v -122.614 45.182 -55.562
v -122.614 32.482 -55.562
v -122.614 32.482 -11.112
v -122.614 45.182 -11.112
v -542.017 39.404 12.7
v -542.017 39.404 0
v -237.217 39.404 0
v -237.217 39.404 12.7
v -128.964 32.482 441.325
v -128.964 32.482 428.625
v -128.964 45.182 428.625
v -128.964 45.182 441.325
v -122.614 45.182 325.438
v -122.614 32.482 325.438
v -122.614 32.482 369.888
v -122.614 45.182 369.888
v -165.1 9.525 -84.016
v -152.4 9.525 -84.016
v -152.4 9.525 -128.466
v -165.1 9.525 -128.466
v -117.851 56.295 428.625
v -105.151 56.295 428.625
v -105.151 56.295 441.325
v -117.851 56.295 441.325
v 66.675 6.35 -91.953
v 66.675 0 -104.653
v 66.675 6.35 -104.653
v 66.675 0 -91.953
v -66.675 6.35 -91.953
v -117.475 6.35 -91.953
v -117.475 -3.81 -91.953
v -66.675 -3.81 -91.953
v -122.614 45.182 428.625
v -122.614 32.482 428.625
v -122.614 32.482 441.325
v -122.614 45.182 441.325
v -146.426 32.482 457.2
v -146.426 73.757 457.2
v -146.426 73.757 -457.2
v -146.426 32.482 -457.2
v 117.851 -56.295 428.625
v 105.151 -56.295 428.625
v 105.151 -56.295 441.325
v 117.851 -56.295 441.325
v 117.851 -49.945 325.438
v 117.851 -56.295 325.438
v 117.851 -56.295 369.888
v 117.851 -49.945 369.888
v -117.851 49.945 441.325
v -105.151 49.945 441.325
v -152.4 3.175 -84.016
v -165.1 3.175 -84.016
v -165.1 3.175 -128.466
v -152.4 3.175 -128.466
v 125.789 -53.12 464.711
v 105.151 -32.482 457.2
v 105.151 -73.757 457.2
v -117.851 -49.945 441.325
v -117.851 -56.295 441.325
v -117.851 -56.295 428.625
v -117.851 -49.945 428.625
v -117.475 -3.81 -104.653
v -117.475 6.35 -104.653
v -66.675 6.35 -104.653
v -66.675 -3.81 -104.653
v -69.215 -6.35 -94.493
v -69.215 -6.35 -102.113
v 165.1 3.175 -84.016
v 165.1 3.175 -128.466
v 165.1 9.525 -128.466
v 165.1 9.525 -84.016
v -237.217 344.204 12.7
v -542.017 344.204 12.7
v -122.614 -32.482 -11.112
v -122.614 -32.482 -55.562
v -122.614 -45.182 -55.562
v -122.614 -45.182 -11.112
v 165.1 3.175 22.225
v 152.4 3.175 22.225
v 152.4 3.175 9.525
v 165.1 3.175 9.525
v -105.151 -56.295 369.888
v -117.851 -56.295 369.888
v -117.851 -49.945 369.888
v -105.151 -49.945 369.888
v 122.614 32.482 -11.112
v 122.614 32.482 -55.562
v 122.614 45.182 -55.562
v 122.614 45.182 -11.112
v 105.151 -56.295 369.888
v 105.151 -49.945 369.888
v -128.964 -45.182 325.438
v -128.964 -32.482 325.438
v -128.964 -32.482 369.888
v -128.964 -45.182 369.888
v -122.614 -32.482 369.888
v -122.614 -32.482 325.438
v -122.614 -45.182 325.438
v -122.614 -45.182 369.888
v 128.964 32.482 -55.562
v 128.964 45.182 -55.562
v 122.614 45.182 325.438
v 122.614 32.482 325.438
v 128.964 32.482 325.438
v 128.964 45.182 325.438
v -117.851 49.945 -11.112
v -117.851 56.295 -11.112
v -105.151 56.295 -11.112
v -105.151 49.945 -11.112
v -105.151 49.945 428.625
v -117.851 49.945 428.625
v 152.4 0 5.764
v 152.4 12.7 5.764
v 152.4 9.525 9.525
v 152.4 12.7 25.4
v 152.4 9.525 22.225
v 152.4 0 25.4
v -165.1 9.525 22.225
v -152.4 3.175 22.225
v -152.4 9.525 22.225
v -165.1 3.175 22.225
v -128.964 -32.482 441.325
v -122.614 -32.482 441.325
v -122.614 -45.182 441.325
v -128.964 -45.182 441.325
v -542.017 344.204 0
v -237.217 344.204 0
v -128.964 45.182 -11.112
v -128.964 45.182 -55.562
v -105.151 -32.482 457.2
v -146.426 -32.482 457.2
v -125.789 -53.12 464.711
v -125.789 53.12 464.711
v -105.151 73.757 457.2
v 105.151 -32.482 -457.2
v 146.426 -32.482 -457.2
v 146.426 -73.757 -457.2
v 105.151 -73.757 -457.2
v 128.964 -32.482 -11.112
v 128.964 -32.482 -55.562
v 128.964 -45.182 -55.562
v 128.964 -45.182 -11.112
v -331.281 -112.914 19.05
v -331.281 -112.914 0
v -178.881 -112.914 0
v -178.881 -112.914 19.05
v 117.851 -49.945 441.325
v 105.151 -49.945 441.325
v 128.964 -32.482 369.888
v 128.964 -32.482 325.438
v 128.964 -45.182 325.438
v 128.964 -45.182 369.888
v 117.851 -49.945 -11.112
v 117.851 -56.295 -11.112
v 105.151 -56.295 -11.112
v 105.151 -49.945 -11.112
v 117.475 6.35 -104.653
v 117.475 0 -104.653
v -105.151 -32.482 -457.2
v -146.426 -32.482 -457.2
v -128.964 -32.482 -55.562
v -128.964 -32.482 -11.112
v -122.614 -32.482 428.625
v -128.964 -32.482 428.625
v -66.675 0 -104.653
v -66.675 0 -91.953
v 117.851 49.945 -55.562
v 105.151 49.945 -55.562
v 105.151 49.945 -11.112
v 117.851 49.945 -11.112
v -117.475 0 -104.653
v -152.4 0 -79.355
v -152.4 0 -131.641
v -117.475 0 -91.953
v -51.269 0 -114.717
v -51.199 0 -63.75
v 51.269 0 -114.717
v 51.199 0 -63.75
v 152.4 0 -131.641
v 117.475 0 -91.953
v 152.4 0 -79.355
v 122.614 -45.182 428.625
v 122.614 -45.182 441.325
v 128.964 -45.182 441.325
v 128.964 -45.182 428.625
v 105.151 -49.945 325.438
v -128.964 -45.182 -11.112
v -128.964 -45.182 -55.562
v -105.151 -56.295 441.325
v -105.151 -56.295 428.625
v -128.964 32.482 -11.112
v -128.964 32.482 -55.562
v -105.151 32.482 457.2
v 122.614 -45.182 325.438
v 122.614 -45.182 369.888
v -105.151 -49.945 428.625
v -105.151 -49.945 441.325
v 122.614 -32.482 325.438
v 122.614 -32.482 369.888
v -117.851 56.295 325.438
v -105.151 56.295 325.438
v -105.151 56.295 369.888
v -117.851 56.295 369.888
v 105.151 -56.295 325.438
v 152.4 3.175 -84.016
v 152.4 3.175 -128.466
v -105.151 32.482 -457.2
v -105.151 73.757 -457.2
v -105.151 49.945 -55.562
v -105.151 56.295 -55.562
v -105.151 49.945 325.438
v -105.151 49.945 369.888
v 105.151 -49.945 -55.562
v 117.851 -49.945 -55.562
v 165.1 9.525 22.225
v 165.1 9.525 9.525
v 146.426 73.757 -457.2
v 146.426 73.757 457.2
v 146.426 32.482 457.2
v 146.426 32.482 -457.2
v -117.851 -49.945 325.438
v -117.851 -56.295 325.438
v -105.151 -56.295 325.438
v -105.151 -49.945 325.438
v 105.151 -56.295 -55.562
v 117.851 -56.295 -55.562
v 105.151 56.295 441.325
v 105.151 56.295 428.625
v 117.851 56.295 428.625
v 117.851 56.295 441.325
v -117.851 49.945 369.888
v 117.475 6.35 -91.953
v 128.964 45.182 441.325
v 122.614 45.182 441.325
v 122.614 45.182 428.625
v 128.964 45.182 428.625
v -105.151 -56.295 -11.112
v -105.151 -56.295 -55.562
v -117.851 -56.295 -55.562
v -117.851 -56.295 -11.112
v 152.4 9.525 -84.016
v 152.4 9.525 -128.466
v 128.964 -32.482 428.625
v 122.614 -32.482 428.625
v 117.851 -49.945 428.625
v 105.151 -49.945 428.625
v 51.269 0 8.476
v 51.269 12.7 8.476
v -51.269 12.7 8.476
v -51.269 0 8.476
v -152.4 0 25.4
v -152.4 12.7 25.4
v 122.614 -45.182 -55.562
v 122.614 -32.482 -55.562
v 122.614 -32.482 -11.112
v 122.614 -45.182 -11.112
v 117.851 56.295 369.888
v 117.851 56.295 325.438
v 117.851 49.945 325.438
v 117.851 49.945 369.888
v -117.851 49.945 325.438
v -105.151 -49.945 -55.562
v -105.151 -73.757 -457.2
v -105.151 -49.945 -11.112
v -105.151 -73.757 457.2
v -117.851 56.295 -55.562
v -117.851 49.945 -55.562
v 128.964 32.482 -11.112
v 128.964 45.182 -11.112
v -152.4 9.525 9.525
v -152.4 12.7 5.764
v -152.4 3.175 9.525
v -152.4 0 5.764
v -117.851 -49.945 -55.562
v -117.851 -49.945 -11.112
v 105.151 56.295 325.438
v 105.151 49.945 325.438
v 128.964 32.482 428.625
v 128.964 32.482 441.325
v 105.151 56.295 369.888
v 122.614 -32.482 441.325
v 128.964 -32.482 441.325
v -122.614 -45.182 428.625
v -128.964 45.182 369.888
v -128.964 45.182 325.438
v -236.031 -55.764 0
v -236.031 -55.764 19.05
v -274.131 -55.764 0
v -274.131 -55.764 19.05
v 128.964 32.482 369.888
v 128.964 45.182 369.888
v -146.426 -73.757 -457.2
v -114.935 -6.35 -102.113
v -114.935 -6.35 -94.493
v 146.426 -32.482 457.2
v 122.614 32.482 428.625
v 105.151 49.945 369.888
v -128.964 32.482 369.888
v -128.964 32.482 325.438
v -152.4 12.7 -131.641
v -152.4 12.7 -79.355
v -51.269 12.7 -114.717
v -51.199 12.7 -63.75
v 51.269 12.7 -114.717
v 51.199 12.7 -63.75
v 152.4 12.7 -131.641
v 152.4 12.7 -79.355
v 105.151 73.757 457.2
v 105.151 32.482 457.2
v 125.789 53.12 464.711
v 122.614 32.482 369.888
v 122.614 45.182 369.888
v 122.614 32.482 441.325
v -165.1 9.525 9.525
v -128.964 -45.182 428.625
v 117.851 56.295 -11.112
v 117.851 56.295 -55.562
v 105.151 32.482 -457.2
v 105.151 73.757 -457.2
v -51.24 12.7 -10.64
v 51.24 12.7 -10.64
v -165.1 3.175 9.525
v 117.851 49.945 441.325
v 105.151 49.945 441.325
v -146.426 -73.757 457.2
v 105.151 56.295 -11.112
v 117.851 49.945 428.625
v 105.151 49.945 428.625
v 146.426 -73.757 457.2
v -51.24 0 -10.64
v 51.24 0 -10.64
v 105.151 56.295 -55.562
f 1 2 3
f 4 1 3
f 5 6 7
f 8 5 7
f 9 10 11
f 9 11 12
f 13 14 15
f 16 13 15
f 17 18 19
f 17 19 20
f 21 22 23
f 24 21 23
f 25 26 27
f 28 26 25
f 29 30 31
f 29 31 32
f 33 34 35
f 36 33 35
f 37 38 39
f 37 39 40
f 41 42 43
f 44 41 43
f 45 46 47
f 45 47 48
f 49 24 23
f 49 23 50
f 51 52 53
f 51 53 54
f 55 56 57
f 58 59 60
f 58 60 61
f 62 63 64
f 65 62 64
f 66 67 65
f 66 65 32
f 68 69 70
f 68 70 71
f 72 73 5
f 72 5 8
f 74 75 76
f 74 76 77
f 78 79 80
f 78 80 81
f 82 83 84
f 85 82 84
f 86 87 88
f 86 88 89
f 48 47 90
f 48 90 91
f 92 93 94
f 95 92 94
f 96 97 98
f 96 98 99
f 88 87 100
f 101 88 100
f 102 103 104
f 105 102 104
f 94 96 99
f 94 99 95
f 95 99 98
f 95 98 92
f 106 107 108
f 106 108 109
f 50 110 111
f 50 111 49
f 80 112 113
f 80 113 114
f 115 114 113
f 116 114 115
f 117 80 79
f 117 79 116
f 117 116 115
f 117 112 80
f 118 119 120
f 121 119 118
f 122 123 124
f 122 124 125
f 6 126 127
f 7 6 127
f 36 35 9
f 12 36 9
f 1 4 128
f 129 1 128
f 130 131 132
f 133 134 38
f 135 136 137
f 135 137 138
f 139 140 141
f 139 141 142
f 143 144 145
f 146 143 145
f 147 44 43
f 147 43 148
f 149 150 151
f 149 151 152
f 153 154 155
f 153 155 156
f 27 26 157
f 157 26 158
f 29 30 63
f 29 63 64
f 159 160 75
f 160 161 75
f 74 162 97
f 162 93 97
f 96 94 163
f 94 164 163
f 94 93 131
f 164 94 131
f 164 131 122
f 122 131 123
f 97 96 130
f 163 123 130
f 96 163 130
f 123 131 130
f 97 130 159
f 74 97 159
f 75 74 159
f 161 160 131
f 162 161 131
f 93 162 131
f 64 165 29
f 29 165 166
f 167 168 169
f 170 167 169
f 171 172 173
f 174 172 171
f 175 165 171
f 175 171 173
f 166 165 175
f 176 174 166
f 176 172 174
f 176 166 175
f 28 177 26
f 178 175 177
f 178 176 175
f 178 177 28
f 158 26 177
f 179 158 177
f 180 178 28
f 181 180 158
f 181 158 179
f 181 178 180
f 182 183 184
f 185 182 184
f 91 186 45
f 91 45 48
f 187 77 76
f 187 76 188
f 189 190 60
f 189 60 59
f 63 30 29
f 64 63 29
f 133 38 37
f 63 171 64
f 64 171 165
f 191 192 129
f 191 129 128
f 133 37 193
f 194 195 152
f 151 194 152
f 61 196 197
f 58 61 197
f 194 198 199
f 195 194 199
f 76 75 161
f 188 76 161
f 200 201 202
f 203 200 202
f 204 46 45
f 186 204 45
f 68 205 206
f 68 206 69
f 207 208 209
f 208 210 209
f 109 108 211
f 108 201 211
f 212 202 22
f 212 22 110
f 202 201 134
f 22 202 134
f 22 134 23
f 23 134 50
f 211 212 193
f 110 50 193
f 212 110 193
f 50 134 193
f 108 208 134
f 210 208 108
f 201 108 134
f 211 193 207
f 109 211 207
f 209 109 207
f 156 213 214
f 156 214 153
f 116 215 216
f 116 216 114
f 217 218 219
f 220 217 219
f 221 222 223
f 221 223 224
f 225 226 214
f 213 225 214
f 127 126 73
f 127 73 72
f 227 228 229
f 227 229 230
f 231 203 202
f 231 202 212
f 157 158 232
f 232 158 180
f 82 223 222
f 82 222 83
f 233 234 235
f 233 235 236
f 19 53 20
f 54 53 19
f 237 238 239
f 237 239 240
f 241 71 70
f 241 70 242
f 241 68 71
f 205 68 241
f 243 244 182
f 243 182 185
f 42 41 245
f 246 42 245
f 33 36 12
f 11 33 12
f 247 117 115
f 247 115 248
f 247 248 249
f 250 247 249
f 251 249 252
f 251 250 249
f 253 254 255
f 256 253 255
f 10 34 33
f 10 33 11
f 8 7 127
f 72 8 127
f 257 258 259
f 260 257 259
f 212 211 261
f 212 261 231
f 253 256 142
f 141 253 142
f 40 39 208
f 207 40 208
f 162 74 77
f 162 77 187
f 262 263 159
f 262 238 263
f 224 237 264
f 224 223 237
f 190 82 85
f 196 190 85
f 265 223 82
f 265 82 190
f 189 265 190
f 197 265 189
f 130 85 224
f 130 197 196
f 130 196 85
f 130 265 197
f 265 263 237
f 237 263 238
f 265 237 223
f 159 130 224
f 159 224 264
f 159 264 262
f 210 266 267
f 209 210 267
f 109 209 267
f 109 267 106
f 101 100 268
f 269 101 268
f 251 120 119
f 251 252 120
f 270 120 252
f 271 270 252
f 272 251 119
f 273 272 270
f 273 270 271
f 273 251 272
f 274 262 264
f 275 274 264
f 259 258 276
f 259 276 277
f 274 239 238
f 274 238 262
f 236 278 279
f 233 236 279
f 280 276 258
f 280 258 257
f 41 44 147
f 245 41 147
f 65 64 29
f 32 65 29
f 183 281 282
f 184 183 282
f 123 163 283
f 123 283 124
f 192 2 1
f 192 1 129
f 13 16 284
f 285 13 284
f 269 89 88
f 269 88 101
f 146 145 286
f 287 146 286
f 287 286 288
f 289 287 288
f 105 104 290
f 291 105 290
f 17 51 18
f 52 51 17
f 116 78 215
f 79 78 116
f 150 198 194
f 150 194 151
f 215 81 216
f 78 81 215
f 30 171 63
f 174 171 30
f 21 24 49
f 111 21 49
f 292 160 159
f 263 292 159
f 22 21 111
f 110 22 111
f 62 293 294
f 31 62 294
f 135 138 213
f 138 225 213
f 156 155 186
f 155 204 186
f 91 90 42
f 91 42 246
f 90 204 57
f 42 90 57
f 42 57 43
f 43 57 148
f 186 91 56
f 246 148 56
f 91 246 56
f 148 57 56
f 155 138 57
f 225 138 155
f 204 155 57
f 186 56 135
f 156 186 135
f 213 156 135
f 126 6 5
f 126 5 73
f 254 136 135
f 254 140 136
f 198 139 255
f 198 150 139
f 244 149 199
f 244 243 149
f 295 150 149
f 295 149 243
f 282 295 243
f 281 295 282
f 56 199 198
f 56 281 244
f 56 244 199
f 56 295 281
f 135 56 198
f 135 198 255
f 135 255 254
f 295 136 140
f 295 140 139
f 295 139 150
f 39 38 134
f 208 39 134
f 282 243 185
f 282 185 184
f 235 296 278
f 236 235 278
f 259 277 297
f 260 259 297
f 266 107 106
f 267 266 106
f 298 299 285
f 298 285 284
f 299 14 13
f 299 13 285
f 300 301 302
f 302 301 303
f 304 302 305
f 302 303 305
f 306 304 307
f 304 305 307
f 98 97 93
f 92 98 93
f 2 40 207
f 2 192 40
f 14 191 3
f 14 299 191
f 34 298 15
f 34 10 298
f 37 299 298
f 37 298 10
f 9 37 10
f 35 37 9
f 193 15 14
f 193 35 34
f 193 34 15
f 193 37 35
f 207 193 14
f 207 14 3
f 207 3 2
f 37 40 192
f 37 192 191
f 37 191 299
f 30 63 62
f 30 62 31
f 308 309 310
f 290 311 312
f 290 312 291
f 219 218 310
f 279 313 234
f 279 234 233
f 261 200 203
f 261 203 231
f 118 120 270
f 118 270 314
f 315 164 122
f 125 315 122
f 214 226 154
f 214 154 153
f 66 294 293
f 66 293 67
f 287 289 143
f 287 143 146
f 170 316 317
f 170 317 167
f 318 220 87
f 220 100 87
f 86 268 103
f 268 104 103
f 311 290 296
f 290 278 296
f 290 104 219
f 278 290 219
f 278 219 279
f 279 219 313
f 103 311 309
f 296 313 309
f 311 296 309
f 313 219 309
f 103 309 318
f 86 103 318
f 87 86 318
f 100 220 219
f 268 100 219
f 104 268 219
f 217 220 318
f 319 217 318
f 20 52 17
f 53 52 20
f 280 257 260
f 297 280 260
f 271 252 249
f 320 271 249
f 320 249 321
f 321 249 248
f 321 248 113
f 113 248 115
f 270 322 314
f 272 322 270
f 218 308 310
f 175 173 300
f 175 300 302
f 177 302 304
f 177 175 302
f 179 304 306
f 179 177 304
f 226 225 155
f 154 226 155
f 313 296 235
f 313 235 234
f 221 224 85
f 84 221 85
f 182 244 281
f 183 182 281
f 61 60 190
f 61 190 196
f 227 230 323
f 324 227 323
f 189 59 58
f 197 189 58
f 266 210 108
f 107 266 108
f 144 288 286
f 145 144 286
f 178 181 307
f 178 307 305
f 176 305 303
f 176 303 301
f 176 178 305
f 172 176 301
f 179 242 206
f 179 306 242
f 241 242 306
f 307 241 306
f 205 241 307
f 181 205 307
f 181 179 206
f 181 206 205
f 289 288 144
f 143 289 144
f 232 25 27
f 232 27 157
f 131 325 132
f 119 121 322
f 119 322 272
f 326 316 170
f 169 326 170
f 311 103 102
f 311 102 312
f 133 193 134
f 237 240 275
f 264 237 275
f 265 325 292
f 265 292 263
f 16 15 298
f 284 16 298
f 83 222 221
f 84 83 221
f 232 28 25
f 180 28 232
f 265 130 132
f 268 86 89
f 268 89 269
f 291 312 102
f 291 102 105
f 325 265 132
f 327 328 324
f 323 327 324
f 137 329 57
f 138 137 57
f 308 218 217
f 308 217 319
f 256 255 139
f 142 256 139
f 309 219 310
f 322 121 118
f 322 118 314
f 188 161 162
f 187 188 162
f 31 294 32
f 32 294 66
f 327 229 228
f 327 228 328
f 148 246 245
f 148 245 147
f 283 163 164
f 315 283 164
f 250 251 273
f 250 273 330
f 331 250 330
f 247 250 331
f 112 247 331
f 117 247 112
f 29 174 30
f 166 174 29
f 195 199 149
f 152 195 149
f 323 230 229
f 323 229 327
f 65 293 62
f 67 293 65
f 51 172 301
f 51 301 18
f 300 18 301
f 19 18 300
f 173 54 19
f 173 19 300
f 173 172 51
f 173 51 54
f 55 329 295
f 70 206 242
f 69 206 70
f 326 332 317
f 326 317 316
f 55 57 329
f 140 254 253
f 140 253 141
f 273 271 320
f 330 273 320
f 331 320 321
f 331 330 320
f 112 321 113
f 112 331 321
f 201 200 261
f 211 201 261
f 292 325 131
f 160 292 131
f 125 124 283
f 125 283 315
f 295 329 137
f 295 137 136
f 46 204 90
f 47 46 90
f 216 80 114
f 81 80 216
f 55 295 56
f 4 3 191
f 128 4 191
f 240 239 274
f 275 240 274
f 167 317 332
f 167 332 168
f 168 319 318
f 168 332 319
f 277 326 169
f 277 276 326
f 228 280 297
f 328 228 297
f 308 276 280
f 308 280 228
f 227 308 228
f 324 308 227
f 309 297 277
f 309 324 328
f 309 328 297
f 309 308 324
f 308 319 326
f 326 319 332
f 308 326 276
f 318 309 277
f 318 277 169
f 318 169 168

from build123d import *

# Parameters (mm, degrees)
F1_DEPTH   = 12.7
F3_DEPTH   = 12.7
F4_W       = 50.8
F4_H       = 12.7
F5_DEPTH   = 6.35
F6_W       = 41.275
F6_H       = 41.275
F7_DEPTH   = 457.2
F7_FACE1_W = 41.275
F7_FACE1_H = 41.275
F9_DEPTH   = 7.9375
F9_TAPER   = 70
F10_W      = 6.35
F10_H      = 12.7
F10_H_2    = 44.45
F12_DEPTH  = 12.7
F11_W      = 12.7
F11_H      = 12.7
F13_DEPTH  = 3.175
F14_W      = 12.7
F14_H      = 12.7
F15_DEPTH  = 3.175
F16_W      = 12.7
F16_H      = 44.45
F17_DEPTH  = 3.175
F18_W      = 12.7
F18_H      = 44.45
F19_DEPTH  = 3.175
F8_W       = 6.35
F8_H       = 12.7
F8_H_2     = 44.45
F20_DEPTH  = 12.7
F23_W      = 50.8
F23_H      = 12.7
F24_DEPTH  = 12.7
F25_SIZE   = 2.54
F26_SIZE   = 2.54
F29_DEPTH  = 19.05
F30_W      = 304.8
F30_H      = 304.8
F31_DEPTH  = 12.7


with BuildPart() as f1:
    # F0 (on Front) → F1 (new body)
    with BuildSketch(Plane.XZ):
        with BuildLine():
            Line((-152.4, 22.225), (-165.1, 22.225))
            Line((-165.1, 22.225), (-165.1, 9.525))
            Line((-165.1, 9.525), (-152.4, 9.525))
            Line((-152.4, 9.525), (-152.4, 5.7641233607))
            ThreePointArc((-152.4, 5.7641233607), (0, -12.7), (152.4, 5.7641233607))
            Line((152.4, 5.7641233607), (152.4, 9.525))
            Line((152.4, 9.525), (165.1, 9.525))
            Line((165.1, 9.525), (165.1, 22.225))
            Line((165.1, 22.225), (152.4, 22.225))
            Line((152.4, 22.225), (152.4, 25.4))
            ThreePointArc((152.4, 25.4), (0, 6.35), (-152.4, 25.4))
            Line((-152.4, 25.4), (-152.4, 22.225))
        make_face()
    extrude(amount=-F1_DEPTH)

    # F11 (on face) → F13 (cut)
    with BuildSketch(Plane.XZ):
        with Locations((-158.75, 15.875)):
            Rectangle(F11_W, F11_H)
        with Locations((158.75, 15.875)):
            Rectangle(F11_W, F11_H)
    extrude(amount=-F13_DEPTH, mode=Mode.SUBTRACT)

    # F14 (on face) → F15 (cut)
    with BuildSketch(Plane(origin=(0, 12.7, 0), x_dir=(-1, 0, 0), z_dir=(0, 1, 0))):
        with Locations((-158.75, 15.875)):
            Rectangle(F14_W, F14_H)
        with Locations((158.75, 15.875)):
            Rectangle(F14_W, F14_H)
    extrude(amount=-F15_DEPTH, mode=Mode.SUBTRACT)


with BuildPart() as f3:
    # F2 (on Front) → F3 (new body)
    with BuildSketch(Plane.XZ):
        with BuildLine():
            Line((-152.4, -84.0155451241), (-165.1, -84.0155451241))
            Line((-165.1, -84.0155451241), (-165.1, -128.4655451241))
            Line((-165.1, -128.4655451241), (-152.4, -128.4655451241))
            Line((-152.4, -128.4655451241), (-152.4, -131.6405451241))
            ThreePointArc((-152.4, -131.6405451241), (0, -112.5905451241), (152.4, -131.6405451241))
            Line((152.4, -131.6405451241), (152.4, -128.4655451241))
            Line((152.4, -128.4655451241), (165.1, -128.4655451241))
            Line((165.1, -128.4655451241), (165.1, -84.0155451241))
            Line((165.1, -84.0155451241), (152.4, -84.0155451241))
            Line((152.4, -84.0155451241), (152.4, -79.3554102101))
            ThreePointArc((152.4, -79.3554102101), (0, -61.7905451241), (-152.4, -79.3554102101))
            Line((-152.4, -79.3554102101), (-152.4, -84.0155451241))
        make_face()
    extrude(amount=-F3_DEPTH)

    # F4 (on face) → F5 (cut)
    with BuildSketch(Plane.XZ):
        with Locations((-92.075, -98.3030451241)):
            Rectangle(F4_W, F4_H)
        with Locations((92.075, -98.3030451241)):
            Rectangle(F4_W, F4_H)
    extrude(amount=-F5_DEPTH, mode=Mode.SUBTRACT)

    # F16 (on face) → F17 (cut)
    with BuildSketch(Plane(origin=(0, 12.7, 0), x_dir=(-1, 0, 0), z_dir=(0, 1, 0))):
        with Locations((-158.75, -106.2405451241)):
            Rectangle(F16_W, F16_H)
        with Locations((158.75, -106.2405451241)):
            Rectangle(F16_W, F16_H)
    extrude(amount=-F17_DEPTH, mode=Mode.SUBTRACT)

    # F18 (on face) → F19 (cut)
    with BuildSketch(Plane.XZ):
        with Locations((-158.75, -106.2405451241)):
            Rectangle(F18_W, F18_H)
        with Locations((158.75, -106.2405451241)):
            Rectangle(F18_W, F18_H)
    extrude(amount=-F19_DEPTH, mode=Mode.SUBTRACT)


with BuildPart() as f7:
    # F6 (on Top) → F7 (new body, symmetric)
    with BuildSketch(Plane.XY):
        with Locations((-125.7886141539, -53.1197041273)):
            Rectangle(F6_W, F6_H)
    extrude(amount=F7_DEPTH, both=True)

    # F7_face1 (on face) → F9 (join)
    with BuildSketch(Plane(origin=(-125.7886141539, -53.1197041273, 457.2), x_dir=(1, 0, 0), z_dir=(0, 0, 1))):
        Rectangle(F7_FACE1_W, F7_FACE1_H)
    extrude(amount=F9_DEPTH, taper=F9_TAPER)

    # F10 (on face) → F12 (cut)
    with BuildSketch(Plane(origin=(0, -32.4822041273, 0), x_dir=(-1, 0, 0), z_dir=(0, 1, 0))):
        with Locations((125.7886141539, 434.975)):
            Rectangle(F10_W, F10_H)
        with Locations((125.7886141539, 347.6625)):
            Rectangle(F10_W, F10_H_2)
        with Locations((125.7886141539, -33.3375)):
            Rectangle(F10_W, F10_H_2)
    extrude(amount=-F12_DEPTH, mode=Mode.SUBTRACT)

    # F8 (on face) → F20 (cut)
    with BuildSketch(Plane.YZ.offset(-105.1511141539)):
        with Locations((-53.1197041273, 434.975)):
            Rectangle(F8_W, F8_H)
        with Locations((-53.1197041273, 347.6625)):
            Rectangle(F8_W, F8_H_2)
        with Locations((-53.1197041273, -33.3375)):
            Rectangle(F8_W, F8_H_2)
    extrude(amount=-F20_DEPTH, mode=Mode.SUBTRACT)


with BuildPart() as f21_1:
    # F21: instance of F7
    add(f7.part.mirror(Plane.YZ))


with BuildPart() as f22_1:
    # F22: instance of F21_1
    add(f21_1.part.mirror(Plane.XZ))


with BuildPart() as f22_2:
    # F22: instance of F7
    add(f7.part.mirror(Plane.XZ))


with BuildPart() as f24:
    # F23 (on face) → F24 (new body)
    with BuildSketch(Plane.XZ.offset(-6.35)):
        with Locations((-92.075, -98.3030451241)):
            Rectangle(F23_W, F23_H)
    extrude(amount=F24_DEPTH)

    # F25
    f25_edges = [f24.edges().sort_by_distance(p)[0] for p in [
        (-92.075, -6.35, -91.953045),
        (-117.475, -6.35, -98.303045),
        (-92.075, -6.35, -104.653045),
        (-66.675, -6.35, -98.303045),
    ]]
    chamfer(f25_edges, length=F25_SIZE)


with BuildPart() as f24b:
    # F23 (on face) → F24, piece 2 (new body)
    with BuildSketch(Plane.XZ.offset(-6.35)):
        with Locations((92.075, -98.3030451241)):
            Rectangle(F23_W, F23_H)
    extrude(amount=F24_DEPTH)

    # F26
    f26_edges = [f24b.edges().sort_by_distance(p)[0] for p in [
        (92.075, -6.35, -91.953045),
        (66.675, -6.35, -98.303045),
        (92.075, -6.35, -104.653045),
        (117.475, -6.35, -98.303045),
    ]]
    chamfer(f26_edges, length=F26_SIZE)


with BuildPart() as f29:
    # F28 (on Top) → F29 (new body)
    with BuildSketch(Plane.XY):
        Polygon((-274.1305302535, -55.7639211248), (-331.2805302535, -112.9139211248), (-178.8805302535, -112.9139211248), (-236.0305302535, -55.7639211248), align=None)
    extrude(amount=F29_DEPTH)


with BuildPart() as f31:
    # F30 (on Top) → F31 (new body)
    with BuildSketch(Plane.XY):
        with Locations((-389.6168153524, 191.8038818777)):
            Rectangle(F30_W, F30_H)
    extrude(amount=F31_DEPTH)


solid = Compound([f1.part, f3.part, f7.part, f21_1.part, f22_1.part, f22_2.part, f24.part, f29.part, f31.part])
